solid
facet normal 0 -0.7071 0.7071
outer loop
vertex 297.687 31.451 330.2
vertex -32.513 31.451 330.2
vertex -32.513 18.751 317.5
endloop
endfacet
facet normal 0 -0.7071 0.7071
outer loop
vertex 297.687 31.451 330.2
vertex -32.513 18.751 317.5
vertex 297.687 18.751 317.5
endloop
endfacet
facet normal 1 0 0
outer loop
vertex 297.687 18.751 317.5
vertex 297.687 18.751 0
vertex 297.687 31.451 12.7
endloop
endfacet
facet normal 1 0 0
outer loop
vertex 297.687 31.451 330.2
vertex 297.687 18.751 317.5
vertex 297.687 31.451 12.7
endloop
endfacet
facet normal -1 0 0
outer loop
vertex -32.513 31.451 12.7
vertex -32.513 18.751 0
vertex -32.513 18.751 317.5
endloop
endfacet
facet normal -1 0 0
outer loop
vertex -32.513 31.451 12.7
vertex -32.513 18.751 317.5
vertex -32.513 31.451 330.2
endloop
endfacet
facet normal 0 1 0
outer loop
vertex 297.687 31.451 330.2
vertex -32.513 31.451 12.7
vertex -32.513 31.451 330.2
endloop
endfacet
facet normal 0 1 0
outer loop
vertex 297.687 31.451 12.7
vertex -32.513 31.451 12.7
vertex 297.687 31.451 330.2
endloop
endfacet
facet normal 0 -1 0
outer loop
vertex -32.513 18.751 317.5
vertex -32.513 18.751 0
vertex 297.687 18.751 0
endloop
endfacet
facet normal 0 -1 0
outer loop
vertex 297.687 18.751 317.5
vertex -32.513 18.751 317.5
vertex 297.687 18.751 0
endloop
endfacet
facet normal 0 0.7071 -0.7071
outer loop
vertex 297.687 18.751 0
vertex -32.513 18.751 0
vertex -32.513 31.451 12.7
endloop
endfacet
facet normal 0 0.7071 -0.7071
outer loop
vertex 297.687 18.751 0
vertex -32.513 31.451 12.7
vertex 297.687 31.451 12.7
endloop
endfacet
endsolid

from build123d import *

# Parameters (mm, degrees)
F0_W     = 330.2
F0_H     = 12.7
F1_DEPTH = 330.2
F2_SIZE  = 12.69999


# Not quite as in the source:
# - a fillet or chamfer is up to 0.001 mm smaller than in the source, because OpenCascade refuses the exact size
# - a feature names something its author has since deleted; it is built from what else it names


with BuildPart() as f1:
    # F0 (on Top) → F1 (new body)
    with BuildSketch(Plane.XY):
        with Locations((132.5867457749, 25.1011773944)):
            Rectangle(F0_W, F0_H)
    extrude(amount=F1_DEPTH)

    # F2 (size 12.7 in the source; OpenCascade refuses exactly that, so slightly less here)
    f2_edges = [f1.edges().sort_by_distance(p)[0] for p in [
        (132.586746, 31.451177, 0),
        (132.586746, 18.751177, 330.2),
    ]]
    chamfer(f2_edges, length=F2_SIZE)


solid = f1.part
